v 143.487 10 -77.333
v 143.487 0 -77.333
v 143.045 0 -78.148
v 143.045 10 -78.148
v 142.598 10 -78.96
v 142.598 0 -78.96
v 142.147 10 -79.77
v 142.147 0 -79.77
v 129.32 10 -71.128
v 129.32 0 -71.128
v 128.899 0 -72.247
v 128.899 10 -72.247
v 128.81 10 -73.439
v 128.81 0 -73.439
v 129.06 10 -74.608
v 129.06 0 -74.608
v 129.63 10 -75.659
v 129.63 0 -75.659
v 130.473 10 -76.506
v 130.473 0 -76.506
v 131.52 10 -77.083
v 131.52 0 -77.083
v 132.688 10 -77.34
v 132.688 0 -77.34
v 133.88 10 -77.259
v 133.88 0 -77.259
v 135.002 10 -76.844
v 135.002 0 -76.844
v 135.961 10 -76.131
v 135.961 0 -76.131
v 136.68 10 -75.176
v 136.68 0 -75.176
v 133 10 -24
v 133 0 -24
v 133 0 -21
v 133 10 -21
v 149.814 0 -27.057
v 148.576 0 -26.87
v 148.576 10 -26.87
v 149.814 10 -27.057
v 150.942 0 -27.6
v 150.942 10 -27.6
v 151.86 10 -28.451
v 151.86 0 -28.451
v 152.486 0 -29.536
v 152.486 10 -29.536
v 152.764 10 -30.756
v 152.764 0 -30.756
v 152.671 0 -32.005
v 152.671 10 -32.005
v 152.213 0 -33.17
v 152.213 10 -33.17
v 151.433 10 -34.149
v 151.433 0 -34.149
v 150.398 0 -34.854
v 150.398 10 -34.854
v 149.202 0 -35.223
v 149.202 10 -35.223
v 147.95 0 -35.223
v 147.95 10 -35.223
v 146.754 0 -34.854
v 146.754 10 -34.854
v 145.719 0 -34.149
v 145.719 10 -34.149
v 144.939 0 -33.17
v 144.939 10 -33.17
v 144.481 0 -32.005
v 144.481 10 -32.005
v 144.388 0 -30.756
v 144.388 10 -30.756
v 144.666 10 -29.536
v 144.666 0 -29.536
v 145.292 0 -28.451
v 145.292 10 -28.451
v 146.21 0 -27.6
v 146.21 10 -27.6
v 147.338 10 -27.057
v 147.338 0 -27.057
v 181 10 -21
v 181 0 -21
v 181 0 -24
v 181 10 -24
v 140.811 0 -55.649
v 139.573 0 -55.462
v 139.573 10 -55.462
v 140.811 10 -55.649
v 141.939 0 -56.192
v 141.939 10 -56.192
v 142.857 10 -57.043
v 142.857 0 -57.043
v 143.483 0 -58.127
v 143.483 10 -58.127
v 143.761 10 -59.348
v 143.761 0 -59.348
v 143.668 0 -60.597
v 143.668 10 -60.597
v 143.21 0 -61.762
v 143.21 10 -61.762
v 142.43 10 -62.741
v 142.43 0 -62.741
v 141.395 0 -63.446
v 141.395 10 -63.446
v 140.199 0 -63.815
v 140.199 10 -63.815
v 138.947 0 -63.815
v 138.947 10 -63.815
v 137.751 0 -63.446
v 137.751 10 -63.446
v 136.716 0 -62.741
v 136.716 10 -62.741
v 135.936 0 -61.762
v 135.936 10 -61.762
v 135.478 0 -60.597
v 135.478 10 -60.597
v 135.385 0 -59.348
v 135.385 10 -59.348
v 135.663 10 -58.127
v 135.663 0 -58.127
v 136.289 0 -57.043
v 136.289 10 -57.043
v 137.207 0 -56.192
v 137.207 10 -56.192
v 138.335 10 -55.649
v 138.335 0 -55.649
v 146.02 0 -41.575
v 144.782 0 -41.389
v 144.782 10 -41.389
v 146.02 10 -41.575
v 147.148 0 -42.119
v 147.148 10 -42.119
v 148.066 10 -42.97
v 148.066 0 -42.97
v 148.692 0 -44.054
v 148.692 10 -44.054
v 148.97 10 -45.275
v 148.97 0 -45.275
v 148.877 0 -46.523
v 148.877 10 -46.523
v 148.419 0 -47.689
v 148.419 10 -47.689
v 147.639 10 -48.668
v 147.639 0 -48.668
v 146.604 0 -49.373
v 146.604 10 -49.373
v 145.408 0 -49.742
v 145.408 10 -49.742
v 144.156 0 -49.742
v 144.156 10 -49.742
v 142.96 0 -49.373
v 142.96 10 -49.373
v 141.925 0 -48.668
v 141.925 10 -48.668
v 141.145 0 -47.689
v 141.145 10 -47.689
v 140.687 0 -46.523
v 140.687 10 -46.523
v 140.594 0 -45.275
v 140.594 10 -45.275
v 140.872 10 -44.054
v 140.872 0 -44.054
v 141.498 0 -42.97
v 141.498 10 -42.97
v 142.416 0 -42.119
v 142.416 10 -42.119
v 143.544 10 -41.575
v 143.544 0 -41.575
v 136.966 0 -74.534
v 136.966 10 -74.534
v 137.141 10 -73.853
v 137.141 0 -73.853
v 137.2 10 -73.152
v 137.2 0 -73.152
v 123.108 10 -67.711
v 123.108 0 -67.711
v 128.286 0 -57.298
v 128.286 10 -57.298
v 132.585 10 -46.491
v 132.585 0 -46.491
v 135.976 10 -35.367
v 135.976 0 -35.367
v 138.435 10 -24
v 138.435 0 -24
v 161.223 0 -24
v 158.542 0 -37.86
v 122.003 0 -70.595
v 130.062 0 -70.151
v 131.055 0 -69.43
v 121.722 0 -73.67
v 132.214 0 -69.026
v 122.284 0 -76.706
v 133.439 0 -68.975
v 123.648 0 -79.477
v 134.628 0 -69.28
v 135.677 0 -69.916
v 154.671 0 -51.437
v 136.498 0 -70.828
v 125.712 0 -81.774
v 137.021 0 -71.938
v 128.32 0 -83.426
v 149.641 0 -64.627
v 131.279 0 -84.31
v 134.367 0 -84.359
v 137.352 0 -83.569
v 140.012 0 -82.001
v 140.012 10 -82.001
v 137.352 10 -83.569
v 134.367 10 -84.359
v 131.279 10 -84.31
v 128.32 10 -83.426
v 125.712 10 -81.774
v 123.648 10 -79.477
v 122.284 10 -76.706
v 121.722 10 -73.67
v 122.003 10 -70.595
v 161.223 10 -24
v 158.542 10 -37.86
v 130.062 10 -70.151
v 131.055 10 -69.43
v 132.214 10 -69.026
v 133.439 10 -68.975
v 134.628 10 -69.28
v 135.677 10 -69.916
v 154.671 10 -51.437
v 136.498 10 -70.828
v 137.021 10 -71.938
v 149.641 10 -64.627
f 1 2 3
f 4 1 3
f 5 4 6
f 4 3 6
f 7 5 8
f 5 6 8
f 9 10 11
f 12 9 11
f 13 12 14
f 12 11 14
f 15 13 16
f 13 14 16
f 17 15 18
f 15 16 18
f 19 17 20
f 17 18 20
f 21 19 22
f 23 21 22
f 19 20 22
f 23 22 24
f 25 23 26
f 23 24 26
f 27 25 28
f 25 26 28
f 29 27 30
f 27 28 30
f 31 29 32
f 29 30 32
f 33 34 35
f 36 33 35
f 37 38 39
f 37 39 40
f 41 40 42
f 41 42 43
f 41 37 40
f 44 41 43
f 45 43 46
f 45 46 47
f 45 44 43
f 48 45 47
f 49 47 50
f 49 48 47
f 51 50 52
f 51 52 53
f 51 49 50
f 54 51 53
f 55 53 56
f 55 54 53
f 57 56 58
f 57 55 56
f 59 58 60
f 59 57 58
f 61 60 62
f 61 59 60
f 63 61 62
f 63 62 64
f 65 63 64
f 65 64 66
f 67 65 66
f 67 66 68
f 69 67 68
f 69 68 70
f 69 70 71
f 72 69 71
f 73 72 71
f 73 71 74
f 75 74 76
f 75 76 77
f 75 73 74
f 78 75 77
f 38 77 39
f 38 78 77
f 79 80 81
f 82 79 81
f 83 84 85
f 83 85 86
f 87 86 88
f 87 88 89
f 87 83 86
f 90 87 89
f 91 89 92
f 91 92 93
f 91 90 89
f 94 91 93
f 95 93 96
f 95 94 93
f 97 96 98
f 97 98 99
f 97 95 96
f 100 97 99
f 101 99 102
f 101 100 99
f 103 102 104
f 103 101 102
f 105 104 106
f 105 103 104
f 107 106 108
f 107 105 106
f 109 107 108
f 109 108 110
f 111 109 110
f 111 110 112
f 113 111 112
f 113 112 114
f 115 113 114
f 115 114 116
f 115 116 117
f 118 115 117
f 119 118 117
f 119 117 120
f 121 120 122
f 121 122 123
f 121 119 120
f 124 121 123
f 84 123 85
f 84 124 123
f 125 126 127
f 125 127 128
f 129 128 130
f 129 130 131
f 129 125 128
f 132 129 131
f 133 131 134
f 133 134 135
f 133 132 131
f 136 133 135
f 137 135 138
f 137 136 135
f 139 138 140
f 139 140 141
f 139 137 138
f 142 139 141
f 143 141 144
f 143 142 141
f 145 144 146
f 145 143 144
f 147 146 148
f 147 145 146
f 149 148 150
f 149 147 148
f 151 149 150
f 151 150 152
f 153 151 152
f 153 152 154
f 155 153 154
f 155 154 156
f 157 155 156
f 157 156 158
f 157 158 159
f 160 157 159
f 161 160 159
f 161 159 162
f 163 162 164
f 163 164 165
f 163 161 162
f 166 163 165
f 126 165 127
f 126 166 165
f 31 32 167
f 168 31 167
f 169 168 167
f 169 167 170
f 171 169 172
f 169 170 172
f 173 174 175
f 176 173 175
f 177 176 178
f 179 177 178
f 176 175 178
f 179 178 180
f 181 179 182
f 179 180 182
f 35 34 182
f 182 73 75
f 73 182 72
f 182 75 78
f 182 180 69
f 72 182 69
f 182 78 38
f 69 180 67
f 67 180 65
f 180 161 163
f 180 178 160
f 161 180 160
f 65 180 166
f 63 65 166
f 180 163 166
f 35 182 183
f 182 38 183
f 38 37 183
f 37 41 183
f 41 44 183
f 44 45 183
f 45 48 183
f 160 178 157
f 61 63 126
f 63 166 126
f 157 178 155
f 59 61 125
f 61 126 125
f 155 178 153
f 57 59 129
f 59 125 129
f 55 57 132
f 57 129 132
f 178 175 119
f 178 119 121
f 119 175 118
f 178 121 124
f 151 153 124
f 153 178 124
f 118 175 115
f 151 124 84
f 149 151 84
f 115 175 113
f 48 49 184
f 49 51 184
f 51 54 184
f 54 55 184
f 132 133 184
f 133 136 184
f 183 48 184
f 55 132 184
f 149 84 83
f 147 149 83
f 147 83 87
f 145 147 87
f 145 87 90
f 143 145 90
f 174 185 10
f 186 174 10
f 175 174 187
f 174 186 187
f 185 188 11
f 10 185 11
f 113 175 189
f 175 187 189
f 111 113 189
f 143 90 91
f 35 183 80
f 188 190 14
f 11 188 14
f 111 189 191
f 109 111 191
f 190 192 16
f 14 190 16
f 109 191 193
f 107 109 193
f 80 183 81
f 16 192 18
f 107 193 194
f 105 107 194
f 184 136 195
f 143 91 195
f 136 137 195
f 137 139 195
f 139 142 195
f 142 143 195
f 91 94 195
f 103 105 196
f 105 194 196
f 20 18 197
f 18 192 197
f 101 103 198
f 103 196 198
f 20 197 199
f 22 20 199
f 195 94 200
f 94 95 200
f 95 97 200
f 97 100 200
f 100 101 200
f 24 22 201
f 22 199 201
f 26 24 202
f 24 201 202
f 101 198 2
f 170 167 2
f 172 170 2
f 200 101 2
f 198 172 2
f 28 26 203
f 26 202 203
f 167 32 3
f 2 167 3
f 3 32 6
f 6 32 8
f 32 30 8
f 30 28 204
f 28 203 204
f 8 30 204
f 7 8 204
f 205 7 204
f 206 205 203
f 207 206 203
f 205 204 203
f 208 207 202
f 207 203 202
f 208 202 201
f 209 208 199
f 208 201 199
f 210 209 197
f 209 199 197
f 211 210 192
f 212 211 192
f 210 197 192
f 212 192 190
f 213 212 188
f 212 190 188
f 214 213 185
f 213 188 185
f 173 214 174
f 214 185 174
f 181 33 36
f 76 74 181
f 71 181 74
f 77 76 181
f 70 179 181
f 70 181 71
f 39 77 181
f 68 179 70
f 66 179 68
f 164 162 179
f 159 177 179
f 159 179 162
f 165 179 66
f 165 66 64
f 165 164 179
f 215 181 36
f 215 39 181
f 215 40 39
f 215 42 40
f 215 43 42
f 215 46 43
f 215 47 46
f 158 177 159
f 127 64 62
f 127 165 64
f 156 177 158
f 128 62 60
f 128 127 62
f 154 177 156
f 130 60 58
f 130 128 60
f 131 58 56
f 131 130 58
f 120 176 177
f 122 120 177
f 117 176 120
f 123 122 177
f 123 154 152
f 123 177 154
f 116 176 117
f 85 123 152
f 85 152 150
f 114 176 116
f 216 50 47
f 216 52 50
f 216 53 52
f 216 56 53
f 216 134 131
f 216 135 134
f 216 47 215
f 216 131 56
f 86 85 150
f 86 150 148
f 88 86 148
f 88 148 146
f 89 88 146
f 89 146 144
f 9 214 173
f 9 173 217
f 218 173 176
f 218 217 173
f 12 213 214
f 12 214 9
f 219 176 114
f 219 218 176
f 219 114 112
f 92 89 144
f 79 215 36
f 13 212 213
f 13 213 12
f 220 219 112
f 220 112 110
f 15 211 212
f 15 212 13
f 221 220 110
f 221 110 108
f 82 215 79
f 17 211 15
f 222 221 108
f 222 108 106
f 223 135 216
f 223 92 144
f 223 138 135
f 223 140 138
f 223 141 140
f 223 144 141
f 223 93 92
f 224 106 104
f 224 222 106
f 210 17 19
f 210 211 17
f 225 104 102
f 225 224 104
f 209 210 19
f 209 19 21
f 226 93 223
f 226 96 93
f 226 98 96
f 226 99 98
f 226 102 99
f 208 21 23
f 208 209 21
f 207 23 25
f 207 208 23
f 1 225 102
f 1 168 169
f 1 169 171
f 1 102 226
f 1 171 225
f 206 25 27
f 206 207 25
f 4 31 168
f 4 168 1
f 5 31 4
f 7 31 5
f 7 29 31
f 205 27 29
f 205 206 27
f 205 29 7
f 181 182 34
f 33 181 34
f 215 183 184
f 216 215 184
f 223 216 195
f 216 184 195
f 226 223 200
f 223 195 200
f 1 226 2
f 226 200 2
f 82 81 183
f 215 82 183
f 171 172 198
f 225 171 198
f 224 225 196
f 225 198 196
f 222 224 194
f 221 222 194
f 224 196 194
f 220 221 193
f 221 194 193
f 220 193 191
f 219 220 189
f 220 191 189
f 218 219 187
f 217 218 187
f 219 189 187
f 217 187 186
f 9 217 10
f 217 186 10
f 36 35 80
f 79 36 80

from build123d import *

# Parameters (mm, degrees)
SKETCH1_R           = 4.2
BOSS_EXTRUDE1_DEPTH = 10


with BuildPart() as part:
    # Sketch1 → Boss-Extrude1 (new body)
    with BuildSketch(Plane(origin=(0, 0, 0), x_dir=(1, 0, 0), z_dir=(0, 1, 0))):
        with BuildLine():
            Line((133, 24), (133, 21))
            Line((133, 21), (173, 21))
            Line((173, 21), (181, 21))
            Line((181, 21), (181, 24))
            Line((181, 24), (173, 24))
            Line((173, 24), (161.223447426, 24))
            ThreePointArc((161.223447426, 24), (154.671414284, 51.436889518), (143.48714405, 77.333301316))
            ThreePointArc((143.48714405, 77.333301316), (142.822320311, 78.554343107), (142.147106039, 79.769669954))
            ThreePointArc((142.147106039, 79.769669954), (126.959135765, 82.689852197), (123.107582845, 67.710952187))
            ThreePointArc((123.107582845, 67.710952187), (132.585040112, 46.491473825), (138.435002799, 24))
            Line((138.435002799, 24), (133, 24))
        make_face()
        with Locations(Location((148.576085497, 31.070096853, 0), (0, 0, 270))):
            Circle(SKETCH1_R, mode=Mode.SUBTRACT)
        with Locations(Location((144.782134175, 45.588789451, 0), (0, 0, 270))):
            Circle(SKETCH1_R, mode=Mode.SUBTRACT)
        with Locations(Location((139.573135396, 59.661913947, 0), (0, 0, 270))):
            Circle(SKETCH1_R, mode=Mode.SUBTRACT)
        with BuildLine():
            ThreePointArc((129.319915673, 71.127825148), (130.975900362, 76.832009114), (136.680084327, 75.176024425))
            ThreePointArc((136.680084327, 75.176024425), (137.067945069, 74.19682809), (137.2, 73.151924787))
            ThreePointArc((137.2, 73.151924787), (134.044903303, 69.083979717), (129.319915673, 71.127825148))
        make_face(mode=Mode.SUBTRACT)
    extrude(amount=BOSS_EXTRUDE1_DEPTH)


solid = part.part
